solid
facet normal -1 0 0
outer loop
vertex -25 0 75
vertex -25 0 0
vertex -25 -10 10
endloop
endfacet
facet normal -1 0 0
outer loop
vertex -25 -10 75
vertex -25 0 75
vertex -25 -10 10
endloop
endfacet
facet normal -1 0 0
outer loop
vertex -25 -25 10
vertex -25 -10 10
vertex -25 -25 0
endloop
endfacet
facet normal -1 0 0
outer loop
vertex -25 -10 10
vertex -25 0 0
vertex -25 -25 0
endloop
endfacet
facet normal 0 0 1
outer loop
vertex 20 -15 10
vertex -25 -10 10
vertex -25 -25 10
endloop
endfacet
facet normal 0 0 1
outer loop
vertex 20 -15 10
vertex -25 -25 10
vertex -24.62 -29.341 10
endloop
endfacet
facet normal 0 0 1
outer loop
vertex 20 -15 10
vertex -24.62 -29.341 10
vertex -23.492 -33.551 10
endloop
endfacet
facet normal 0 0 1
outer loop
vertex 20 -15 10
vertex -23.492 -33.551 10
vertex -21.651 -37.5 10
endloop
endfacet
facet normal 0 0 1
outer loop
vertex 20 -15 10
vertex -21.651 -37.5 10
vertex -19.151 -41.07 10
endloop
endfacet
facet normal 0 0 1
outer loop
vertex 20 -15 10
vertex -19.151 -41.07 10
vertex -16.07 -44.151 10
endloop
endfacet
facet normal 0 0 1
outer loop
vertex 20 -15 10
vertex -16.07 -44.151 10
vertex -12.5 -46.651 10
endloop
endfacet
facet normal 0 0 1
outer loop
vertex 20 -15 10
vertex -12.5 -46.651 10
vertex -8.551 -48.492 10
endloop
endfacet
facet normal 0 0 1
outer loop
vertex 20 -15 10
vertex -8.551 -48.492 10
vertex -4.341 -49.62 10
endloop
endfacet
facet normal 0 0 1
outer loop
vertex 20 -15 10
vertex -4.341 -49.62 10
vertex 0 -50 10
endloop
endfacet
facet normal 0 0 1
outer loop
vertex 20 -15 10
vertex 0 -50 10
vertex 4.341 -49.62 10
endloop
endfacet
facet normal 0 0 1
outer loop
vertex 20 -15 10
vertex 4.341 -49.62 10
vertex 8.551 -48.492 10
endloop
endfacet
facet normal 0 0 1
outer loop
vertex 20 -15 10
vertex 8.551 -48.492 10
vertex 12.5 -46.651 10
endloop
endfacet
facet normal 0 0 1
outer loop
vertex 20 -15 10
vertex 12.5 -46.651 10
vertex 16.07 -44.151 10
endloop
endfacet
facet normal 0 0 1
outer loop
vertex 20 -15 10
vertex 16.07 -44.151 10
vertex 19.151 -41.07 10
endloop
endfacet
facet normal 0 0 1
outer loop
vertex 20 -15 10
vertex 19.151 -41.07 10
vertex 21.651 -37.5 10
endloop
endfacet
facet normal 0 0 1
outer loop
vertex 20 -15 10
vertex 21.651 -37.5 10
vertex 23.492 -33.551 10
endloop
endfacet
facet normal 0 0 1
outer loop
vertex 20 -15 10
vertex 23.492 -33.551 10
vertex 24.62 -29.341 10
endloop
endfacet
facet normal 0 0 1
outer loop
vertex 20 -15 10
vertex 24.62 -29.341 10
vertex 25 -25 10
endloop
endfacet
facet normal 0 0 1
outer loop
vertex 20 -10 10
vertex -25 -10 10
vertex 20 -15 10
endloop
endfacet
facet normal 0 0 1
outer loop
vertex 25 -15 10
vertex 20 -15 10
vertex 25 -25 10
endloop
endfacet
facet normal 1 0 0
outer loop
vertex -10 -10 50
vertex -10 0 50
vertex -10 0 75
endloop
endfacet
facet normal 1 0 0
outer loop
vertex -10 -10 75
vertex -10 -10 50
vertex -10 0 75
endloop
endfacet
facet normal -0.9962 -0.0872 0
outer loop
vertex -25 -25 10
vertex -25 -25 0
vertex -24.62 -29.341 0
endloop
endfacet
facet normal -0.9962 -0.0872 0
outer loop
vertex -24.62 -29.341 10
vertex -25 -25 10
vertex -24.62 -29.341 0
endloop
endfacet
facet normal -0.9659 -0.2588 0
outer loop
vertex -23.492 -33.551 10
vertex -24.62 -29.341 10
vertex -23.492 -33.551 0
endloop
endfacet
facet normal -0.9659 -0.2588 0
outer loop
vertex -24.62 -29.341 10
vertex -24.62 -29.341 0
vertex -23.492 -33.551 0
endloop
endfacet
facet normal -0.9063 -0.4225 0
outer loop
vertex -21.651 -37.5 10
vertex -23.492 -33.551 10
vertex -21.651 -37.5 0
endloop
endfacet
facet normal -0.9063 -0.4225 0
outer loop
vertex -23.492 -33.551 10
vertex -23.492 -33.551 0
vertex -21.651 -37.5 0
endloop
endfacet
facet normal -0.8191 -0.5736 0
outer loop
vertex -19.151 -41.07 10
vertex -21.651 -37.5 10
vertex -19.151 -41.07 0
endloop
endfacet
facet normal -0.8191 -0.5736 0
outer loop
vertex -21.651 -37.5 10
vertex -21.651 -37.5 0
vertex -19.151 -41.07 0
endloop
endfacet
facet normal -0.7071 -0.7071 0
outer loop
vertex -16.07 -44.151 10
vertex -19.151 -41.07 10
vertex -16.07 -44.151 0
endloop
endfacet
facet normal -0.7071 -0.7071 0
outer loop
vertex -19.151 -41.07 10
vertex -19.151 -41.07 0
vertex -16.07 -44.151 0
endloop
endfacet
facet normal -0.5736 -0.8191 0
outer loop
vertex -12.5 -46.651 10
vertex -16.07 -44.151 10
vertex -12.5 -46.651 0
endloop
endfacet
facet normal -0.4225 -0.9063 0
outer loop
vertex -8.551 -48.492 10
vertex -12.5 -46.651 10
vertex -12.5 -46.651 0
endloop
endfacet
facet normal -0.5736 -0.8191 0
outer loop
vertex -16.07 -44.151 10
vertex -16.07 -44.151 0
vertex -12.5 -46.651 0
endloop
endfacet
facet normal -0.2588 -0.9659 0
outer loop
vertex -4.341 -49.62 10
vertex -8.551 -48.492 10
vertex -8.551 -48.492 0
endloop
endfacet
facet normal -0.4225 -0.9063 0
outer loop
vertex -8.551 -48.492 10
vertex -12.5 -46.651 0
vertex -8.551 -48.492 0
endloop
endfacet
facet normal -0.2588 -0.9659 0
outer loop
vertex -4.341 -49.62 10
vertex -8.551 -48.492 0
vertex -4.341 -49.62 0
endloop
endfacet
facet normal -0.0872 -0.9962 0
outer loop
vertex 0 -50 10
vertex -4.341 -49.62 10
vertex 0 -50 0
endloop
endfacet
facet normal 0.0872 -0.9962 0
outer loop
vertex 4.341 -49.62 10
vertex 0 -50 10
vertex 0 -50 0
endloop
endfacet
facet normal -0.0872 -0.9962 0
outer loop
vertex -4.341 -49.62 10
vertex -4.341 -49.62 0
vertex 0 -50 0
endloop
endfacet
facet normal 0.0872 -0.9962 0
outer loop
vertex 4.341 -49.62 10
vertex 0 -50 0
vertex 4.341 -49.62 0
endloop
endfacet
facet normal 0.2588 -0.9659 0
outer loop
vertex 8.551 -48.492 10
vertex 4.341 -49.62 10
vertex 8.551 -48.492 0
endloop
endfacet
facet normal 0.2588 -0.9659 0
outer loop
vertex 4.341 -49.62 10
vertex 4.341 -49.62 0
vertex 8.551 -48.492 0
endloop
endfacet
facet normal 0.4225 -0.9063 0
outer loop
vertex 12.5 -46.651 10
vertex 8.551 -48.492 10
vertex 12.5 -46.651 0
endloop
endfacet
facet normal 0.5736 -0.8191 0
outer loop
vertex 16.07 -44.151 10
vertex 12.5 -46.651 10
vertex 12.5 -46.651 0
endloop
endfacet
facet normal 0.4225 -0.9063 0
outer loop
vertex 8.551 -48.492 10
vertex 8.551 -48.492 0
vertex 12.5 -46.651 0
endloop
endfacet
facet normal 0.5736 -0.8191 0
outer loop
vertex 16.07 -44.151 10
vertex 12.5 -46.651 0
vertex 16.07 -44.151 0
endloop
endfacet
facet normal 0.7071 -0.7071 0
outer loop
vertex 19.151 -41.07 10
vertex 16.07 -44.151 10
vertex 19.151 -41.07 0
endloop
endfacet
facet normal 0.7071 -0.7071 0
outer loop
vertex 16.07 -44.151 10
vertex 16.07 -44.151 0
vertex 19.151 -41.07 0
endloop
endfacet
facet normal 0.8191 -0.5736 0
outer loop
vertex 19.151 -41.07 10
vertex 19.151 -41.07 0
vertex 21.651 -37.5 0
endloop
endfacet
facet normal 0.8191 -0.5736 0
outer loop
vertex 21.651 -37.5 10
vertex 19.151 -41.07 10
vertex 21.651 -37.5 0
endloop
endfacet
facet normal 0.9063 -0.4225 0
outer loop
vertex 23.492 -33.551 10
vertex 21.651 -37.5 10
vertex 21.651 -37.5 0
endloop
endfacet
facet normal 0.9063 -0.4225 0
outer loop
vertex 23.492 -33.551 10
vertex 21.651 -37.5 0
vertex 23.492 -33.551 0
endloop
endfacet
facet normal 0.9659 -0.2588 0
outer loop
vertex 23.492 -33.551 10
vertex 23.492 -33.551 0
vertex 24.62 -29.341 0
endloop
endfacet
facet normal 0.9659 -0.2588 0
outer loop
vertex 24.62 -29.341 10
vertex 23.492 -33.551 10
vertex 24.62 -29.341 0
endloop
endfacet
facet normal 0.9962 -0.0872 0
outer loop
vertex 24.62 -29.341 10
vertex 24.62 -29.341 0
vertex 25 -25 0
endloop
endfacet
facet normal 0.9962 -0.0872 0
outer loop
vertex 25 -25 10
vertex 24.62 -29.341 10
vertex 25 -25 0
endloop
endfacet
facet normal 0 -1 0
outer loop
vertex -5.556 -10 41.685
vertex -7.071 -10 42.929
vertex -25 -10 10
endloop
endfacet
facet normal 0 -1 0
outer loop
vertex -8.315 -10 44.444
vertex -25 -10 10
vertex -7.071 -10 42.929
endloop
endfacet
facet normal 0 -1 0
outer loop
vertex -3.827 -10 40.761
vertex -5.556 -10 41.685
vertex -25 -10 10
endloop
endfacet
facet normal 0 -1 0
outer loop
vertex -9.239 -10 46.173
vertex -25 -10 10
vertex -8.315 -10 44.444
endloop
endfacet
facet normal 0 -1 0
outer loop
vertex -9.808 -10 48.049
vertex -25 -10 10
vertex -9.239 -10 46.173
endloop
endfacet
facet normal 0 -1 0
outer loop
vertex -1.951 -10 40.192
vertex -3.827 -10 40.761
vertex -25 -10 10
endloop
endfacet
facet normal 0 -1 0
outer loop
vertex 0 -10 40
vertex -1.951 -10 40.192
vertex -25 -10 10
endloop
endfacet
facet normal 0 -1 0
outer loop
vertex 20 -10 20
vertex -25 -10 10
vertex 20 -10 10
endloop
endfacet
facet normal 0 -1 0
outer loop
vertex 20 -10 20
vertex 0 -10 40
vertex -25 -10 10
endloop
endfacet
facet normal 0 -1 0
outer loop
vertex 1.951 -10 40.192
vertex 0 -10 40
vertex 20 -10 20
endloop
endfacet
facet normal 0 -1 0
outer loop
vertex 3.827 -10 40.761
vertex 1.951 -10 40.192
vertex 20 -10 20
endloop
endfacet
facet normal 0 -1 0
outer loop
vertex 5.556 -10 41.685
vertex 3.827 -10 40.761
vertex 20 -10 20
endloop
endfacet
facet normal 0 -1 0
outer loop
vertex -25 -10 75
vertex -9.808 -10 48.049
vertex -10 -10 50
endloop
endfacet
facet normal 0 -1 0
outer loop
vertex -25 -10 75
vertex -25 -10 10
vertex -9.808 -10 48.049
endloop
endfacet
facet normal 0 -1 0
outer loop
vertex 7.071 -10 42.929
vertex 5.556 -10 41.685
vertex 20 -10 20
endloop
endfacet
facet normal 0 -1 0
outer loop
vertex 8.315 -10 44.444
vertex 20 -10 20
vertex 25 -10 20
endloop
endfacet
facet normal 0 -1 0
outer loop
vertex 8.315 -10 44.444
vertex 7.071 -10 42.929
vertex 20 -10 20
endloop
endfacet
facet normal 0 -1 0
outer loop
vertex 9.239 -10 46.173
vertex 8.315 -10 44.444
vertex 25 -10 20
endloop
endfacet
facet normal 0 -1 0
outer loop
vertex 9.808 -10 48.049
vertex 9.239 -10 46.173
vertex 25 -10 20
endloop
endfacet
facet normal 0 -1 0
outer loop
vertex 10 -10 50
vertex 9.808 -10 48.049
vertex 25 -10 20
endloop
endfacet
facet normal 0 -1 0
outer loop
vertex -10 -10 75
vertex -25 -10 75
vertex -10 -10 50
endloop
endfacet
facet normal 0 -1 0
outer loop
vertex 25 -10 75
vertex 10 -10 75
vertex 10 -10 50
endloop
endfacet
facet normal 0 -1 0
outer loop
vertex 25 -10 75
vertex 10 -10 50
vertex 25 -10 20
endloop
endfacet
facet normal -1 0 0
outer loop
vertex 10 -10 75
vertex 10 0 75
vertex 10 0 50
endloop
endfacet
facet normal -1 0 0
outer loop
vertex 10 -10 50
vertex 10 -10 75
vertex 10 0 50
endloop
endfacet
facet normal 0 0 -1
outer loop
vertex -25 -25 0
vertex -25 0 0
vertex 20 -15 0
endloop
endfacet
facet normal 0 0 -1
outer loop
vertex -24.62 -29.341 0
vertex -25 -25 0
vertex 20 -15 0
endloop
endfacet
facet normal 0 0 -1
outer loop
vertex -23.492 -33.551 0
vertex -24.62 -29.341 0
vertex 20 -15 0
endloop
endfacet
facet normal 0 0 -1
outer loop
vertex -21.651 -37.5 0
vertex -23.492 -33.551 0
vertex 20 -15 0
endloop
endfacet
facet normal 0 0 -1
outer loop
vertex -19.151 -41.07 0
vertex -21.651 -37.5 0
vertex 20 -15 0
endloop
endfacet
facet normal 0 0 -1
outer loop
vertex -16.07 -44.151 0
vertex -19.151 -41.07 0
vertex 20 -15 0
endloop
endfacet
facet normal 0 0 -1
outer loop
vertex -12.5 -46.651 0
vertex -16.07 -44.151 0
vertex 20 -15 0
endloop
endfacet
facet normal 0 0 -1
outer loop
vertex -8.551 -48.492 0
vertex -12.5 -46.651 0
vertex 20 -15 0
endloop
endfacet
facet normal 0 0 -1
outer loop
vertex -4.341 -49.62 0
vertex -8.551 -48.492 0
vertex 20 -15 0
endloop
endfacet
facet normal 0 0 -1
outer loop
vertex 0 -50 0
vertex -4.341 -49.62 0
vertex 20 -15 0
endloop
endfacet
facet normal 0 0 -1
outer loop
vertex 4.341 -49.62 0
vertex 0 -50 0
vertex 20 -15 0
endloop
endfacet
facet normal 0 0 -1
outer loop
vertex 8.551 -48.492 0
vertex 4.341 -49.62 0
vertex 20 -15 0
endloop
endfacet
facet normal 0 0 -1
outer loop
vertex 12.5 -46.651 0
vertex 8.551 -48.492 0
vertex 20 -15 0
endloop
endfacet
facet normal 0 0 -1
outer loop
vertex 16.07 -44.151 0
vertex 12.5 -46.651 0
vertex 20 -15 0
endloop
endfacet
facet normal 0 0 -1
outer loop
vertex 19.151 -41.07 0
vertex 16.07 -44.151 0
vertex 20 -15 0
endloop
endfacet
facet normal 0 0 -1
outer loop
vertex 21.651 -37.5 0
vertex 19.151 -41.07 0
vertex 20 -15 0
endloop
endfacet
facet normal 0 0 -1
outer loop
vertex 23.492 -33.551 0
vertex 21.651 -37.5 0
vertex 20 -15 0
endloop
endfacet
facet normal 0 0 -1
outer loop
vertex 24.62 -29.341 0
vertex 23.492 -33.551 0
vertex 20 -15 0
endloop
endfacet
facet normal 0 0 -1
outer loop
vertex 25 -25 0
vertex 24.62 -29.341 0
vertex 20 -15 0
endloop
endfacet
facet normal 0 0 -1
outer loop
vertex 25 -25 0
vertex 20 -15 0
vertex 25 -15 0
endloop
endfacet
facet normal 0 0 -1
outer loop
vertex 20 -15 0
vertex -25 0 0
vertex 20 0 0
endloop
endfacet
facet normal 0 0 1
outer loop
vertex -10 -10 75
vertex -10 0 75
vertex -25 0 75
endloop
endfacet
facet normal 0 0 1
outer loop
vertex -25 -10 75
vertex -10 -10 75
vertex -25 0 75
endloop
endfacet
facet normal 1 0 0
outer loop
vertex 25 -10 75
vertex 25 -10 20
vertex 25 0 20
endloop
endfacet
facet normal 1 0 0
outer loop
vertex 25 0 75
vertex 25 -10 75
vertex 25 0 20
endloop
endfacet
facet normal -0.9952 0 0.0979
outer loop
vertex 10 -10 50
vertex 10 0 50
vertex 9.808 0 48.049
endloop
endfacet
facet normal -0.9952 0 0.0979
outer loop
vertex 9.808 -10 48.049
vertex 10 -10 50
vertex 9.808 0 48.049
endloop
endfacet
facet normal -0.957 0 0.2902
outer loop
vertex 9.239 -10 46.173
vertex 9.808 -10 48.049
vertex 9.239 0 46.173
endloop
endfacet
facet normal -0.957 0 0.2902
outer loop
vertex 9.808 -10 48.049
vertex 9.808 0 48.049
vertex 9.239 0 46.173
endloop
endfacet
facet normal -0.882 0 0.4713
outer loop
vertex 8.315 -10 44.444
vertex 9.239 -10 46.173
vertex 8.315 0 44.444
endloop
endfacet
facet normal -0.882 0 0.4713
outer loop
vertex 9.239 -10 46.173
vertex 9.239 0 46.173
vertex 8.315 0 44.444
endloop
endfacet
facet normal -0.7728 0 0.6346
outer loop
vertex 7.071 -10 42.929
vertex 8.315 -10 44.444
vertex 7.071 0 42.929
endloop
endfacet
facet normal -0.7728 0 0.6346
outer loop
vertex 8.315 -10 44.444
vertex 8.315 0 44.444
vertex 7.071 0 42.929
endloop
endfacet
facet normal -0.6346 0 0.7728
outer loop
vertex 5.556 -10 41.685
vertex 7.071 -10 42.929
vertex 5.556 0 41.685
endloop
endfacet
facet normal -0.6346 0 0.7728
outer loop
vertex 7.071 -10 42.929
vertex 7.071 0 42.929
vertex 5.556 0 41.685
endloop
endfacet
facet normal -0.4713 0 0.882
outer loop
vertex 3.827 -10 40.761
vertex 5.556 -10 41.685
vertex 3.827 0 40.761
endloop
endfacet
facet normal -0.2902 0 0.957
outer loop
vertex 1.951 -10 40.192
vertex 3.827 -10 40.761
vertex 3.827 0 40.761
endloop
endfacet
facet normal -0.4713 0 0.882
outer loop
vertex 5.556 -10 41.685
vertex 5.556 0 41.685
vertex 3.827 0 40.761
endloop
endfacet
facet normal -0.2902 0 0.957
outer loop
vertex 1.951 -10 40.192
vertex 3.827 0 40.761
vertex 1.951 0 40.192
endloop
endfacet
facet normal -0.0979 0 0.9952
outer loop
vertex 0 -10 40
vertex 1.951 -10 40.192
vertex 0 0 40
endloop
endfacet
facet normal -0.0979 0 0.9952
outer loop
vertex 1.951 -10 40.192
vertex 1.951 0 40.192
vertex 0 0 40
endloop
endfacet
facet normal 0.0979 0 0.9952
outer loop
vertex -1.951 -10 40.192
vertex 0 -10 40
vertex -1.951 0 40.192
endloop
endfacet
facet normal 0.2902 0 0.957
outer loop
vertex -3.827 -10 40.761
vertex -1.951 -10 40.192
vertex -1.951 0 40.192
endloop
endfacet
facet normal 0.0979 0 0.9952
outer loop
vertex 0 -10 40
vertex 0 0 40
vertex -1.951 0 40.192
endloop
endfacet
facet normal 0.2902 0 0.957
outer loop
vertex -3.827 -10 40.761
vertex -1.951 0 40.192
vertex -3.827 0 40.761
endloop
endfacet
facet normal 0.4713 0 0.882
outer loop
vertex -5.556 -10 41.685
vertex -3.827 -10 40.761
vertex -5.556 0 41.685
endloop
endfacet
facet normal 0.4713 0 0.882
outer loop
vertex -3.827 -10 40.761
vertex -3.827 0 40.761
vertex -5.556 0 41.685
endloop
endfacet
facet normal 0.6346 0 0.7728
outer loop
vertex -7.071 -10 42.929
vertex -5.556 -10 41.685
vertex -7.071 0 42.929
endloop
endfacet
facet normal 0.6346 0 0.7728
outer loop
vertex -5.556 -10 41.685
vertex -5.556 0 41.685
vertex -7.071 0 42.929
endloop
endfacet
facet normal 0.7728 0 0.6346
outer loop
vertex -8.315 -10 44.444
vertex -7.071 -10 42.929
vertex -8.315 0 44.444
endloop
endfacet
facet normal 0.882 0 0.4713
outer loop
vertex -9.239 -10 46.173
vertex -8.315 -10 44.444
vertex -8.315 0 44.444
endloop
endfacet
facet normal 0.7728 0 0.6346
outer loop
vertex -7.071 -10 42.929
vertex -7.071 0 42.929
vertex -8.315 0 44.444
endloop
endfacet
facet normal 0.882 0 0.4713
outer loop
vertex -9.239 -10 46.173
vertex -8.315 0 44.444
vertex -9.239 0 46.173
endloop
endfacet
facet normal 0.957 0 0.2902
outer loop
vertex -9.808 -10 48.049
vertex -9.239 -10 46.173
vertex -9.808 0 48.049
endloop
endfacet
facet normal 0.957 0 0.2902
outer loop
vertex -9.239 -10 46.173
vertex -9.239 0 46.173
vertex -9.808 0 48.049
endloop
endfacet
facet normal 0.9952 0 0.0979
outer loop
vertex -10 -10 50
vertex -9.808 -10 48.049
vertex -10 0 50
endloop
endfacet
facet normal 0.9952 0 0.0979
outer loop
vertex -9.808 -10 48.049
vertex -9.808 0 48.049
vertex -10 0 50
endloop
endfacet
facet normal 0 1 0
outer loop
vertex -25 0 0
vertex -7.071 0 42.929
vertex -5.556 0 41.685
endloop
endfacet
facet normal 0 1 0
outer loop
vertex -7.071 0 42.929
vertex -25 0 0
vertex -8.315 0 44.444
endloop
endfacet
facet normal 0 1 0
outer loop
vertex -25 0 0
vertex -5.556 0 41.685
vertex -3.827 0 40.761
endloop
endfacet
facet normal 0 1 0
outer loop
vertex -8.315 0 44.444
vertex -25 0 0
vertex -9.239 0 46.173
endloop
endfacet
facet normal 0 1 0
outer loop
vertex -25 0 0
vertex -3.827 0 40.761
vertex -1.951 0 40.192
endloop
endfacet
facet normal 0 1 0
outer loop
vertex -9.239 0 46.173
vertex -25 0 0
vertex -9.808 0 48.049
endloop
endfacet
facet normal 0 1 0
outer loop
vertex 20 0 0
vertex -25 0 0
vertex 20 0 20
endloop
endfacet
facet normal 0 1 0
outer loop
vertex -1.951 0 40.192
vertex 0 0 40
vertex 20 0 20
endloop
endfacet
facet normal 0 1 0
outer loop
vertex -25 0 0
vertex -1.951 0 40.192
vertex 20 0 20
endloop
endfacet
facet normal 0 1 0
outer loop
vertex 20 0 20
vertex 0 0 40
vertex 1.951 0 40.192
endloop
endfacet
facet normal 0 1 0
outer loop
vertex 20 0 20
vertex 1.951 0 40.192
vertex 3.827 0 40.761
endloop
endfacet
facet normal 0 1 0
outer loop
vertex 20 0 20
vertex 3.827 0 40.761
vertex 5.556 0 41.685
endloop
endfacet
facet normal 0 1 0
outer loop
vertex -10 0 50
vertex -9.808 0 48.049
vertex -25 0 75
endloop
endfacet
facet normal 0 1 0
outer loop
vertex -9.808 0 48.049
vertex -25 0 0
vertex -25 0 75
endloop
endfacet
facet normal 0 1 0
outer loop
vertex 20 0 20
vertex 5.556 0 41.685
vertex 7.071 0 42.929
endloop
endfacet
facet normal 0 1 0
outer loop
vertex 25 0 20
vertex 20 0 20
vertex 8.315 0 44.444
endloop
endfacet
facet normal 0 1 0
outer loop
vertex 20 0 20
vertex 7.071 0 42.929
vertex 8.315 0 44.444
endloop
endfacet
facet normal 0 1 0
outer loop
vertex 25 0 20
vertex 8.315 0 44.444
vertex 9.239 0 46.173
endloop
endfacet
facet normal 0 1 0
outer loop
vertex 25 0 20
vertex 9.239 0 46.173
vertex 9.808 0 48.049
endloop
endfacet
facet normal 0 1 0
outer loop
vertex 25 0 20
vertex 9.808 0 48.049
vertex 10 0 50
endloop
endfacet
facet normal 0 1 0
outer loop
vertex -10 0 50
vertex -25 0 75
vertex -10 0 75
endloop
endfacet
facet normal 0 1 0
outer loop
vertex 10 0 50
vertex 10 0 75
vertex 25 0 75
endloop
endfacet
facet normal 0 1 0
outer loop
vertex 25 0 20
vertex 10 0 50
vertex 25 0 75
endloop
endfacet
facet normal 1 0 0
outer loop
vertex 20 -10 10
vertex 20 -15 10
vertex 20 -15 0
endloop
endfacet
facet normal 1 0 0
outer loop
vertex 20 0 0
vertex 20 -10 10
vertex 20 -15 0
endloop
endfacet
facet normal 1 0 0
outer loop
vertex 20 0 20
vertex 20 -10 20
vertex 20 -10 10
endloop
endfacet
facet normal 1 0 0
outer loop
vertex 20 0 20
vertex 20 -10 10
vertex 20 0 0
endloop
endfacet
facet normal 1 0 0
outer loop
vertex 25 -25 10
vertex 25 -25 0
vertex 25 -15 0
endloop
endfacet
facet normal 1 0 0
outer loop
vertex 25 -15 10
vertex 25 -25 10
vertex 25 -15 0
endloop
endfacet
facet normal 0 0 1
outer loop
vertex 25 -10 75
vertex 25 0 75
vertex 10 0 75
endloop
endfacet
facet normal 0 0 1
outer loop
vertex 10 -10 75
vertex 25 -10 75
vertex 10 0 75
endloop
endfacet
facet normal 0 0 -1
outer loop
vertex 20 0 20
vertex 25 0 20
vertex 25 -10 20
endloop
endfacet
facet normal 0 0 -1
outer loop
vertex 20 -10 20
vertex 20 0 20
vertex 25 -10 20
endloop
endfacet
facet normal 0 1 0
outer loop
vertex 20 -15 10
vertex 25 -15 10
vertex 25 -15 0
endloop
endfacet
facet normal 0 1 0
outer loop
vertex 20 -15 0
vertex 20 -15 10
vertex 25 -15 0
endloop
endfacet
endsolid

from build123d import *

# Parameters (mm, degrees)
F1_DEPTH = 10
F3_DEPTH = 10
F5_DEPTH = 5


with BuildPart() as f1:
    # F0 (on Front) → F1 (new body)
    with BuildSketch(Plane.XZ):
        with BuildLine():
            Line((-25, 75), (-25, 0))
            Line((-25, 0), (25, 0))
            Line((25, 0), (25, 75))
            Line((25, 75), (10, 75))
            Line((10, 75), (10, 50))
            ThreePointArc((10, 50), (0, 40), (-10, 50))
            Line((-10, 50), (-10, 75))
            Line((-10, 75), (-25, 75))
        make_face()
    extrude(amount=F1_DEPTH)

    # F2 (on Top) → F3 (join)
    with BuildSketch(Plane.XY):
        with BuildLine():
            Line((10, -10), (-10, -10))
            Line((-10, -10), (-25, -10))
            Line((-25, -10), (-25, -25))
            ThreePointArc((-25, -25), (0, -50), (25, -25))
            Line((25, -25), (25, -10))
            Line((25, -10), (10, -10))
        make_face()
    extrude(amount=F3_DEPTH)

    # F4 (on face) → F5 (cut)
    with BuildSketch(Plane.YZ.offset(25)):
        Polygon((0, 20), (-10, 20), (-10, 10), (-15, 10), (-15, 0), (0, 0), align=None)
    extrude(amount=-F5_DEPTH, mode=Mode.SUBTRACT)


solid = f1.part
